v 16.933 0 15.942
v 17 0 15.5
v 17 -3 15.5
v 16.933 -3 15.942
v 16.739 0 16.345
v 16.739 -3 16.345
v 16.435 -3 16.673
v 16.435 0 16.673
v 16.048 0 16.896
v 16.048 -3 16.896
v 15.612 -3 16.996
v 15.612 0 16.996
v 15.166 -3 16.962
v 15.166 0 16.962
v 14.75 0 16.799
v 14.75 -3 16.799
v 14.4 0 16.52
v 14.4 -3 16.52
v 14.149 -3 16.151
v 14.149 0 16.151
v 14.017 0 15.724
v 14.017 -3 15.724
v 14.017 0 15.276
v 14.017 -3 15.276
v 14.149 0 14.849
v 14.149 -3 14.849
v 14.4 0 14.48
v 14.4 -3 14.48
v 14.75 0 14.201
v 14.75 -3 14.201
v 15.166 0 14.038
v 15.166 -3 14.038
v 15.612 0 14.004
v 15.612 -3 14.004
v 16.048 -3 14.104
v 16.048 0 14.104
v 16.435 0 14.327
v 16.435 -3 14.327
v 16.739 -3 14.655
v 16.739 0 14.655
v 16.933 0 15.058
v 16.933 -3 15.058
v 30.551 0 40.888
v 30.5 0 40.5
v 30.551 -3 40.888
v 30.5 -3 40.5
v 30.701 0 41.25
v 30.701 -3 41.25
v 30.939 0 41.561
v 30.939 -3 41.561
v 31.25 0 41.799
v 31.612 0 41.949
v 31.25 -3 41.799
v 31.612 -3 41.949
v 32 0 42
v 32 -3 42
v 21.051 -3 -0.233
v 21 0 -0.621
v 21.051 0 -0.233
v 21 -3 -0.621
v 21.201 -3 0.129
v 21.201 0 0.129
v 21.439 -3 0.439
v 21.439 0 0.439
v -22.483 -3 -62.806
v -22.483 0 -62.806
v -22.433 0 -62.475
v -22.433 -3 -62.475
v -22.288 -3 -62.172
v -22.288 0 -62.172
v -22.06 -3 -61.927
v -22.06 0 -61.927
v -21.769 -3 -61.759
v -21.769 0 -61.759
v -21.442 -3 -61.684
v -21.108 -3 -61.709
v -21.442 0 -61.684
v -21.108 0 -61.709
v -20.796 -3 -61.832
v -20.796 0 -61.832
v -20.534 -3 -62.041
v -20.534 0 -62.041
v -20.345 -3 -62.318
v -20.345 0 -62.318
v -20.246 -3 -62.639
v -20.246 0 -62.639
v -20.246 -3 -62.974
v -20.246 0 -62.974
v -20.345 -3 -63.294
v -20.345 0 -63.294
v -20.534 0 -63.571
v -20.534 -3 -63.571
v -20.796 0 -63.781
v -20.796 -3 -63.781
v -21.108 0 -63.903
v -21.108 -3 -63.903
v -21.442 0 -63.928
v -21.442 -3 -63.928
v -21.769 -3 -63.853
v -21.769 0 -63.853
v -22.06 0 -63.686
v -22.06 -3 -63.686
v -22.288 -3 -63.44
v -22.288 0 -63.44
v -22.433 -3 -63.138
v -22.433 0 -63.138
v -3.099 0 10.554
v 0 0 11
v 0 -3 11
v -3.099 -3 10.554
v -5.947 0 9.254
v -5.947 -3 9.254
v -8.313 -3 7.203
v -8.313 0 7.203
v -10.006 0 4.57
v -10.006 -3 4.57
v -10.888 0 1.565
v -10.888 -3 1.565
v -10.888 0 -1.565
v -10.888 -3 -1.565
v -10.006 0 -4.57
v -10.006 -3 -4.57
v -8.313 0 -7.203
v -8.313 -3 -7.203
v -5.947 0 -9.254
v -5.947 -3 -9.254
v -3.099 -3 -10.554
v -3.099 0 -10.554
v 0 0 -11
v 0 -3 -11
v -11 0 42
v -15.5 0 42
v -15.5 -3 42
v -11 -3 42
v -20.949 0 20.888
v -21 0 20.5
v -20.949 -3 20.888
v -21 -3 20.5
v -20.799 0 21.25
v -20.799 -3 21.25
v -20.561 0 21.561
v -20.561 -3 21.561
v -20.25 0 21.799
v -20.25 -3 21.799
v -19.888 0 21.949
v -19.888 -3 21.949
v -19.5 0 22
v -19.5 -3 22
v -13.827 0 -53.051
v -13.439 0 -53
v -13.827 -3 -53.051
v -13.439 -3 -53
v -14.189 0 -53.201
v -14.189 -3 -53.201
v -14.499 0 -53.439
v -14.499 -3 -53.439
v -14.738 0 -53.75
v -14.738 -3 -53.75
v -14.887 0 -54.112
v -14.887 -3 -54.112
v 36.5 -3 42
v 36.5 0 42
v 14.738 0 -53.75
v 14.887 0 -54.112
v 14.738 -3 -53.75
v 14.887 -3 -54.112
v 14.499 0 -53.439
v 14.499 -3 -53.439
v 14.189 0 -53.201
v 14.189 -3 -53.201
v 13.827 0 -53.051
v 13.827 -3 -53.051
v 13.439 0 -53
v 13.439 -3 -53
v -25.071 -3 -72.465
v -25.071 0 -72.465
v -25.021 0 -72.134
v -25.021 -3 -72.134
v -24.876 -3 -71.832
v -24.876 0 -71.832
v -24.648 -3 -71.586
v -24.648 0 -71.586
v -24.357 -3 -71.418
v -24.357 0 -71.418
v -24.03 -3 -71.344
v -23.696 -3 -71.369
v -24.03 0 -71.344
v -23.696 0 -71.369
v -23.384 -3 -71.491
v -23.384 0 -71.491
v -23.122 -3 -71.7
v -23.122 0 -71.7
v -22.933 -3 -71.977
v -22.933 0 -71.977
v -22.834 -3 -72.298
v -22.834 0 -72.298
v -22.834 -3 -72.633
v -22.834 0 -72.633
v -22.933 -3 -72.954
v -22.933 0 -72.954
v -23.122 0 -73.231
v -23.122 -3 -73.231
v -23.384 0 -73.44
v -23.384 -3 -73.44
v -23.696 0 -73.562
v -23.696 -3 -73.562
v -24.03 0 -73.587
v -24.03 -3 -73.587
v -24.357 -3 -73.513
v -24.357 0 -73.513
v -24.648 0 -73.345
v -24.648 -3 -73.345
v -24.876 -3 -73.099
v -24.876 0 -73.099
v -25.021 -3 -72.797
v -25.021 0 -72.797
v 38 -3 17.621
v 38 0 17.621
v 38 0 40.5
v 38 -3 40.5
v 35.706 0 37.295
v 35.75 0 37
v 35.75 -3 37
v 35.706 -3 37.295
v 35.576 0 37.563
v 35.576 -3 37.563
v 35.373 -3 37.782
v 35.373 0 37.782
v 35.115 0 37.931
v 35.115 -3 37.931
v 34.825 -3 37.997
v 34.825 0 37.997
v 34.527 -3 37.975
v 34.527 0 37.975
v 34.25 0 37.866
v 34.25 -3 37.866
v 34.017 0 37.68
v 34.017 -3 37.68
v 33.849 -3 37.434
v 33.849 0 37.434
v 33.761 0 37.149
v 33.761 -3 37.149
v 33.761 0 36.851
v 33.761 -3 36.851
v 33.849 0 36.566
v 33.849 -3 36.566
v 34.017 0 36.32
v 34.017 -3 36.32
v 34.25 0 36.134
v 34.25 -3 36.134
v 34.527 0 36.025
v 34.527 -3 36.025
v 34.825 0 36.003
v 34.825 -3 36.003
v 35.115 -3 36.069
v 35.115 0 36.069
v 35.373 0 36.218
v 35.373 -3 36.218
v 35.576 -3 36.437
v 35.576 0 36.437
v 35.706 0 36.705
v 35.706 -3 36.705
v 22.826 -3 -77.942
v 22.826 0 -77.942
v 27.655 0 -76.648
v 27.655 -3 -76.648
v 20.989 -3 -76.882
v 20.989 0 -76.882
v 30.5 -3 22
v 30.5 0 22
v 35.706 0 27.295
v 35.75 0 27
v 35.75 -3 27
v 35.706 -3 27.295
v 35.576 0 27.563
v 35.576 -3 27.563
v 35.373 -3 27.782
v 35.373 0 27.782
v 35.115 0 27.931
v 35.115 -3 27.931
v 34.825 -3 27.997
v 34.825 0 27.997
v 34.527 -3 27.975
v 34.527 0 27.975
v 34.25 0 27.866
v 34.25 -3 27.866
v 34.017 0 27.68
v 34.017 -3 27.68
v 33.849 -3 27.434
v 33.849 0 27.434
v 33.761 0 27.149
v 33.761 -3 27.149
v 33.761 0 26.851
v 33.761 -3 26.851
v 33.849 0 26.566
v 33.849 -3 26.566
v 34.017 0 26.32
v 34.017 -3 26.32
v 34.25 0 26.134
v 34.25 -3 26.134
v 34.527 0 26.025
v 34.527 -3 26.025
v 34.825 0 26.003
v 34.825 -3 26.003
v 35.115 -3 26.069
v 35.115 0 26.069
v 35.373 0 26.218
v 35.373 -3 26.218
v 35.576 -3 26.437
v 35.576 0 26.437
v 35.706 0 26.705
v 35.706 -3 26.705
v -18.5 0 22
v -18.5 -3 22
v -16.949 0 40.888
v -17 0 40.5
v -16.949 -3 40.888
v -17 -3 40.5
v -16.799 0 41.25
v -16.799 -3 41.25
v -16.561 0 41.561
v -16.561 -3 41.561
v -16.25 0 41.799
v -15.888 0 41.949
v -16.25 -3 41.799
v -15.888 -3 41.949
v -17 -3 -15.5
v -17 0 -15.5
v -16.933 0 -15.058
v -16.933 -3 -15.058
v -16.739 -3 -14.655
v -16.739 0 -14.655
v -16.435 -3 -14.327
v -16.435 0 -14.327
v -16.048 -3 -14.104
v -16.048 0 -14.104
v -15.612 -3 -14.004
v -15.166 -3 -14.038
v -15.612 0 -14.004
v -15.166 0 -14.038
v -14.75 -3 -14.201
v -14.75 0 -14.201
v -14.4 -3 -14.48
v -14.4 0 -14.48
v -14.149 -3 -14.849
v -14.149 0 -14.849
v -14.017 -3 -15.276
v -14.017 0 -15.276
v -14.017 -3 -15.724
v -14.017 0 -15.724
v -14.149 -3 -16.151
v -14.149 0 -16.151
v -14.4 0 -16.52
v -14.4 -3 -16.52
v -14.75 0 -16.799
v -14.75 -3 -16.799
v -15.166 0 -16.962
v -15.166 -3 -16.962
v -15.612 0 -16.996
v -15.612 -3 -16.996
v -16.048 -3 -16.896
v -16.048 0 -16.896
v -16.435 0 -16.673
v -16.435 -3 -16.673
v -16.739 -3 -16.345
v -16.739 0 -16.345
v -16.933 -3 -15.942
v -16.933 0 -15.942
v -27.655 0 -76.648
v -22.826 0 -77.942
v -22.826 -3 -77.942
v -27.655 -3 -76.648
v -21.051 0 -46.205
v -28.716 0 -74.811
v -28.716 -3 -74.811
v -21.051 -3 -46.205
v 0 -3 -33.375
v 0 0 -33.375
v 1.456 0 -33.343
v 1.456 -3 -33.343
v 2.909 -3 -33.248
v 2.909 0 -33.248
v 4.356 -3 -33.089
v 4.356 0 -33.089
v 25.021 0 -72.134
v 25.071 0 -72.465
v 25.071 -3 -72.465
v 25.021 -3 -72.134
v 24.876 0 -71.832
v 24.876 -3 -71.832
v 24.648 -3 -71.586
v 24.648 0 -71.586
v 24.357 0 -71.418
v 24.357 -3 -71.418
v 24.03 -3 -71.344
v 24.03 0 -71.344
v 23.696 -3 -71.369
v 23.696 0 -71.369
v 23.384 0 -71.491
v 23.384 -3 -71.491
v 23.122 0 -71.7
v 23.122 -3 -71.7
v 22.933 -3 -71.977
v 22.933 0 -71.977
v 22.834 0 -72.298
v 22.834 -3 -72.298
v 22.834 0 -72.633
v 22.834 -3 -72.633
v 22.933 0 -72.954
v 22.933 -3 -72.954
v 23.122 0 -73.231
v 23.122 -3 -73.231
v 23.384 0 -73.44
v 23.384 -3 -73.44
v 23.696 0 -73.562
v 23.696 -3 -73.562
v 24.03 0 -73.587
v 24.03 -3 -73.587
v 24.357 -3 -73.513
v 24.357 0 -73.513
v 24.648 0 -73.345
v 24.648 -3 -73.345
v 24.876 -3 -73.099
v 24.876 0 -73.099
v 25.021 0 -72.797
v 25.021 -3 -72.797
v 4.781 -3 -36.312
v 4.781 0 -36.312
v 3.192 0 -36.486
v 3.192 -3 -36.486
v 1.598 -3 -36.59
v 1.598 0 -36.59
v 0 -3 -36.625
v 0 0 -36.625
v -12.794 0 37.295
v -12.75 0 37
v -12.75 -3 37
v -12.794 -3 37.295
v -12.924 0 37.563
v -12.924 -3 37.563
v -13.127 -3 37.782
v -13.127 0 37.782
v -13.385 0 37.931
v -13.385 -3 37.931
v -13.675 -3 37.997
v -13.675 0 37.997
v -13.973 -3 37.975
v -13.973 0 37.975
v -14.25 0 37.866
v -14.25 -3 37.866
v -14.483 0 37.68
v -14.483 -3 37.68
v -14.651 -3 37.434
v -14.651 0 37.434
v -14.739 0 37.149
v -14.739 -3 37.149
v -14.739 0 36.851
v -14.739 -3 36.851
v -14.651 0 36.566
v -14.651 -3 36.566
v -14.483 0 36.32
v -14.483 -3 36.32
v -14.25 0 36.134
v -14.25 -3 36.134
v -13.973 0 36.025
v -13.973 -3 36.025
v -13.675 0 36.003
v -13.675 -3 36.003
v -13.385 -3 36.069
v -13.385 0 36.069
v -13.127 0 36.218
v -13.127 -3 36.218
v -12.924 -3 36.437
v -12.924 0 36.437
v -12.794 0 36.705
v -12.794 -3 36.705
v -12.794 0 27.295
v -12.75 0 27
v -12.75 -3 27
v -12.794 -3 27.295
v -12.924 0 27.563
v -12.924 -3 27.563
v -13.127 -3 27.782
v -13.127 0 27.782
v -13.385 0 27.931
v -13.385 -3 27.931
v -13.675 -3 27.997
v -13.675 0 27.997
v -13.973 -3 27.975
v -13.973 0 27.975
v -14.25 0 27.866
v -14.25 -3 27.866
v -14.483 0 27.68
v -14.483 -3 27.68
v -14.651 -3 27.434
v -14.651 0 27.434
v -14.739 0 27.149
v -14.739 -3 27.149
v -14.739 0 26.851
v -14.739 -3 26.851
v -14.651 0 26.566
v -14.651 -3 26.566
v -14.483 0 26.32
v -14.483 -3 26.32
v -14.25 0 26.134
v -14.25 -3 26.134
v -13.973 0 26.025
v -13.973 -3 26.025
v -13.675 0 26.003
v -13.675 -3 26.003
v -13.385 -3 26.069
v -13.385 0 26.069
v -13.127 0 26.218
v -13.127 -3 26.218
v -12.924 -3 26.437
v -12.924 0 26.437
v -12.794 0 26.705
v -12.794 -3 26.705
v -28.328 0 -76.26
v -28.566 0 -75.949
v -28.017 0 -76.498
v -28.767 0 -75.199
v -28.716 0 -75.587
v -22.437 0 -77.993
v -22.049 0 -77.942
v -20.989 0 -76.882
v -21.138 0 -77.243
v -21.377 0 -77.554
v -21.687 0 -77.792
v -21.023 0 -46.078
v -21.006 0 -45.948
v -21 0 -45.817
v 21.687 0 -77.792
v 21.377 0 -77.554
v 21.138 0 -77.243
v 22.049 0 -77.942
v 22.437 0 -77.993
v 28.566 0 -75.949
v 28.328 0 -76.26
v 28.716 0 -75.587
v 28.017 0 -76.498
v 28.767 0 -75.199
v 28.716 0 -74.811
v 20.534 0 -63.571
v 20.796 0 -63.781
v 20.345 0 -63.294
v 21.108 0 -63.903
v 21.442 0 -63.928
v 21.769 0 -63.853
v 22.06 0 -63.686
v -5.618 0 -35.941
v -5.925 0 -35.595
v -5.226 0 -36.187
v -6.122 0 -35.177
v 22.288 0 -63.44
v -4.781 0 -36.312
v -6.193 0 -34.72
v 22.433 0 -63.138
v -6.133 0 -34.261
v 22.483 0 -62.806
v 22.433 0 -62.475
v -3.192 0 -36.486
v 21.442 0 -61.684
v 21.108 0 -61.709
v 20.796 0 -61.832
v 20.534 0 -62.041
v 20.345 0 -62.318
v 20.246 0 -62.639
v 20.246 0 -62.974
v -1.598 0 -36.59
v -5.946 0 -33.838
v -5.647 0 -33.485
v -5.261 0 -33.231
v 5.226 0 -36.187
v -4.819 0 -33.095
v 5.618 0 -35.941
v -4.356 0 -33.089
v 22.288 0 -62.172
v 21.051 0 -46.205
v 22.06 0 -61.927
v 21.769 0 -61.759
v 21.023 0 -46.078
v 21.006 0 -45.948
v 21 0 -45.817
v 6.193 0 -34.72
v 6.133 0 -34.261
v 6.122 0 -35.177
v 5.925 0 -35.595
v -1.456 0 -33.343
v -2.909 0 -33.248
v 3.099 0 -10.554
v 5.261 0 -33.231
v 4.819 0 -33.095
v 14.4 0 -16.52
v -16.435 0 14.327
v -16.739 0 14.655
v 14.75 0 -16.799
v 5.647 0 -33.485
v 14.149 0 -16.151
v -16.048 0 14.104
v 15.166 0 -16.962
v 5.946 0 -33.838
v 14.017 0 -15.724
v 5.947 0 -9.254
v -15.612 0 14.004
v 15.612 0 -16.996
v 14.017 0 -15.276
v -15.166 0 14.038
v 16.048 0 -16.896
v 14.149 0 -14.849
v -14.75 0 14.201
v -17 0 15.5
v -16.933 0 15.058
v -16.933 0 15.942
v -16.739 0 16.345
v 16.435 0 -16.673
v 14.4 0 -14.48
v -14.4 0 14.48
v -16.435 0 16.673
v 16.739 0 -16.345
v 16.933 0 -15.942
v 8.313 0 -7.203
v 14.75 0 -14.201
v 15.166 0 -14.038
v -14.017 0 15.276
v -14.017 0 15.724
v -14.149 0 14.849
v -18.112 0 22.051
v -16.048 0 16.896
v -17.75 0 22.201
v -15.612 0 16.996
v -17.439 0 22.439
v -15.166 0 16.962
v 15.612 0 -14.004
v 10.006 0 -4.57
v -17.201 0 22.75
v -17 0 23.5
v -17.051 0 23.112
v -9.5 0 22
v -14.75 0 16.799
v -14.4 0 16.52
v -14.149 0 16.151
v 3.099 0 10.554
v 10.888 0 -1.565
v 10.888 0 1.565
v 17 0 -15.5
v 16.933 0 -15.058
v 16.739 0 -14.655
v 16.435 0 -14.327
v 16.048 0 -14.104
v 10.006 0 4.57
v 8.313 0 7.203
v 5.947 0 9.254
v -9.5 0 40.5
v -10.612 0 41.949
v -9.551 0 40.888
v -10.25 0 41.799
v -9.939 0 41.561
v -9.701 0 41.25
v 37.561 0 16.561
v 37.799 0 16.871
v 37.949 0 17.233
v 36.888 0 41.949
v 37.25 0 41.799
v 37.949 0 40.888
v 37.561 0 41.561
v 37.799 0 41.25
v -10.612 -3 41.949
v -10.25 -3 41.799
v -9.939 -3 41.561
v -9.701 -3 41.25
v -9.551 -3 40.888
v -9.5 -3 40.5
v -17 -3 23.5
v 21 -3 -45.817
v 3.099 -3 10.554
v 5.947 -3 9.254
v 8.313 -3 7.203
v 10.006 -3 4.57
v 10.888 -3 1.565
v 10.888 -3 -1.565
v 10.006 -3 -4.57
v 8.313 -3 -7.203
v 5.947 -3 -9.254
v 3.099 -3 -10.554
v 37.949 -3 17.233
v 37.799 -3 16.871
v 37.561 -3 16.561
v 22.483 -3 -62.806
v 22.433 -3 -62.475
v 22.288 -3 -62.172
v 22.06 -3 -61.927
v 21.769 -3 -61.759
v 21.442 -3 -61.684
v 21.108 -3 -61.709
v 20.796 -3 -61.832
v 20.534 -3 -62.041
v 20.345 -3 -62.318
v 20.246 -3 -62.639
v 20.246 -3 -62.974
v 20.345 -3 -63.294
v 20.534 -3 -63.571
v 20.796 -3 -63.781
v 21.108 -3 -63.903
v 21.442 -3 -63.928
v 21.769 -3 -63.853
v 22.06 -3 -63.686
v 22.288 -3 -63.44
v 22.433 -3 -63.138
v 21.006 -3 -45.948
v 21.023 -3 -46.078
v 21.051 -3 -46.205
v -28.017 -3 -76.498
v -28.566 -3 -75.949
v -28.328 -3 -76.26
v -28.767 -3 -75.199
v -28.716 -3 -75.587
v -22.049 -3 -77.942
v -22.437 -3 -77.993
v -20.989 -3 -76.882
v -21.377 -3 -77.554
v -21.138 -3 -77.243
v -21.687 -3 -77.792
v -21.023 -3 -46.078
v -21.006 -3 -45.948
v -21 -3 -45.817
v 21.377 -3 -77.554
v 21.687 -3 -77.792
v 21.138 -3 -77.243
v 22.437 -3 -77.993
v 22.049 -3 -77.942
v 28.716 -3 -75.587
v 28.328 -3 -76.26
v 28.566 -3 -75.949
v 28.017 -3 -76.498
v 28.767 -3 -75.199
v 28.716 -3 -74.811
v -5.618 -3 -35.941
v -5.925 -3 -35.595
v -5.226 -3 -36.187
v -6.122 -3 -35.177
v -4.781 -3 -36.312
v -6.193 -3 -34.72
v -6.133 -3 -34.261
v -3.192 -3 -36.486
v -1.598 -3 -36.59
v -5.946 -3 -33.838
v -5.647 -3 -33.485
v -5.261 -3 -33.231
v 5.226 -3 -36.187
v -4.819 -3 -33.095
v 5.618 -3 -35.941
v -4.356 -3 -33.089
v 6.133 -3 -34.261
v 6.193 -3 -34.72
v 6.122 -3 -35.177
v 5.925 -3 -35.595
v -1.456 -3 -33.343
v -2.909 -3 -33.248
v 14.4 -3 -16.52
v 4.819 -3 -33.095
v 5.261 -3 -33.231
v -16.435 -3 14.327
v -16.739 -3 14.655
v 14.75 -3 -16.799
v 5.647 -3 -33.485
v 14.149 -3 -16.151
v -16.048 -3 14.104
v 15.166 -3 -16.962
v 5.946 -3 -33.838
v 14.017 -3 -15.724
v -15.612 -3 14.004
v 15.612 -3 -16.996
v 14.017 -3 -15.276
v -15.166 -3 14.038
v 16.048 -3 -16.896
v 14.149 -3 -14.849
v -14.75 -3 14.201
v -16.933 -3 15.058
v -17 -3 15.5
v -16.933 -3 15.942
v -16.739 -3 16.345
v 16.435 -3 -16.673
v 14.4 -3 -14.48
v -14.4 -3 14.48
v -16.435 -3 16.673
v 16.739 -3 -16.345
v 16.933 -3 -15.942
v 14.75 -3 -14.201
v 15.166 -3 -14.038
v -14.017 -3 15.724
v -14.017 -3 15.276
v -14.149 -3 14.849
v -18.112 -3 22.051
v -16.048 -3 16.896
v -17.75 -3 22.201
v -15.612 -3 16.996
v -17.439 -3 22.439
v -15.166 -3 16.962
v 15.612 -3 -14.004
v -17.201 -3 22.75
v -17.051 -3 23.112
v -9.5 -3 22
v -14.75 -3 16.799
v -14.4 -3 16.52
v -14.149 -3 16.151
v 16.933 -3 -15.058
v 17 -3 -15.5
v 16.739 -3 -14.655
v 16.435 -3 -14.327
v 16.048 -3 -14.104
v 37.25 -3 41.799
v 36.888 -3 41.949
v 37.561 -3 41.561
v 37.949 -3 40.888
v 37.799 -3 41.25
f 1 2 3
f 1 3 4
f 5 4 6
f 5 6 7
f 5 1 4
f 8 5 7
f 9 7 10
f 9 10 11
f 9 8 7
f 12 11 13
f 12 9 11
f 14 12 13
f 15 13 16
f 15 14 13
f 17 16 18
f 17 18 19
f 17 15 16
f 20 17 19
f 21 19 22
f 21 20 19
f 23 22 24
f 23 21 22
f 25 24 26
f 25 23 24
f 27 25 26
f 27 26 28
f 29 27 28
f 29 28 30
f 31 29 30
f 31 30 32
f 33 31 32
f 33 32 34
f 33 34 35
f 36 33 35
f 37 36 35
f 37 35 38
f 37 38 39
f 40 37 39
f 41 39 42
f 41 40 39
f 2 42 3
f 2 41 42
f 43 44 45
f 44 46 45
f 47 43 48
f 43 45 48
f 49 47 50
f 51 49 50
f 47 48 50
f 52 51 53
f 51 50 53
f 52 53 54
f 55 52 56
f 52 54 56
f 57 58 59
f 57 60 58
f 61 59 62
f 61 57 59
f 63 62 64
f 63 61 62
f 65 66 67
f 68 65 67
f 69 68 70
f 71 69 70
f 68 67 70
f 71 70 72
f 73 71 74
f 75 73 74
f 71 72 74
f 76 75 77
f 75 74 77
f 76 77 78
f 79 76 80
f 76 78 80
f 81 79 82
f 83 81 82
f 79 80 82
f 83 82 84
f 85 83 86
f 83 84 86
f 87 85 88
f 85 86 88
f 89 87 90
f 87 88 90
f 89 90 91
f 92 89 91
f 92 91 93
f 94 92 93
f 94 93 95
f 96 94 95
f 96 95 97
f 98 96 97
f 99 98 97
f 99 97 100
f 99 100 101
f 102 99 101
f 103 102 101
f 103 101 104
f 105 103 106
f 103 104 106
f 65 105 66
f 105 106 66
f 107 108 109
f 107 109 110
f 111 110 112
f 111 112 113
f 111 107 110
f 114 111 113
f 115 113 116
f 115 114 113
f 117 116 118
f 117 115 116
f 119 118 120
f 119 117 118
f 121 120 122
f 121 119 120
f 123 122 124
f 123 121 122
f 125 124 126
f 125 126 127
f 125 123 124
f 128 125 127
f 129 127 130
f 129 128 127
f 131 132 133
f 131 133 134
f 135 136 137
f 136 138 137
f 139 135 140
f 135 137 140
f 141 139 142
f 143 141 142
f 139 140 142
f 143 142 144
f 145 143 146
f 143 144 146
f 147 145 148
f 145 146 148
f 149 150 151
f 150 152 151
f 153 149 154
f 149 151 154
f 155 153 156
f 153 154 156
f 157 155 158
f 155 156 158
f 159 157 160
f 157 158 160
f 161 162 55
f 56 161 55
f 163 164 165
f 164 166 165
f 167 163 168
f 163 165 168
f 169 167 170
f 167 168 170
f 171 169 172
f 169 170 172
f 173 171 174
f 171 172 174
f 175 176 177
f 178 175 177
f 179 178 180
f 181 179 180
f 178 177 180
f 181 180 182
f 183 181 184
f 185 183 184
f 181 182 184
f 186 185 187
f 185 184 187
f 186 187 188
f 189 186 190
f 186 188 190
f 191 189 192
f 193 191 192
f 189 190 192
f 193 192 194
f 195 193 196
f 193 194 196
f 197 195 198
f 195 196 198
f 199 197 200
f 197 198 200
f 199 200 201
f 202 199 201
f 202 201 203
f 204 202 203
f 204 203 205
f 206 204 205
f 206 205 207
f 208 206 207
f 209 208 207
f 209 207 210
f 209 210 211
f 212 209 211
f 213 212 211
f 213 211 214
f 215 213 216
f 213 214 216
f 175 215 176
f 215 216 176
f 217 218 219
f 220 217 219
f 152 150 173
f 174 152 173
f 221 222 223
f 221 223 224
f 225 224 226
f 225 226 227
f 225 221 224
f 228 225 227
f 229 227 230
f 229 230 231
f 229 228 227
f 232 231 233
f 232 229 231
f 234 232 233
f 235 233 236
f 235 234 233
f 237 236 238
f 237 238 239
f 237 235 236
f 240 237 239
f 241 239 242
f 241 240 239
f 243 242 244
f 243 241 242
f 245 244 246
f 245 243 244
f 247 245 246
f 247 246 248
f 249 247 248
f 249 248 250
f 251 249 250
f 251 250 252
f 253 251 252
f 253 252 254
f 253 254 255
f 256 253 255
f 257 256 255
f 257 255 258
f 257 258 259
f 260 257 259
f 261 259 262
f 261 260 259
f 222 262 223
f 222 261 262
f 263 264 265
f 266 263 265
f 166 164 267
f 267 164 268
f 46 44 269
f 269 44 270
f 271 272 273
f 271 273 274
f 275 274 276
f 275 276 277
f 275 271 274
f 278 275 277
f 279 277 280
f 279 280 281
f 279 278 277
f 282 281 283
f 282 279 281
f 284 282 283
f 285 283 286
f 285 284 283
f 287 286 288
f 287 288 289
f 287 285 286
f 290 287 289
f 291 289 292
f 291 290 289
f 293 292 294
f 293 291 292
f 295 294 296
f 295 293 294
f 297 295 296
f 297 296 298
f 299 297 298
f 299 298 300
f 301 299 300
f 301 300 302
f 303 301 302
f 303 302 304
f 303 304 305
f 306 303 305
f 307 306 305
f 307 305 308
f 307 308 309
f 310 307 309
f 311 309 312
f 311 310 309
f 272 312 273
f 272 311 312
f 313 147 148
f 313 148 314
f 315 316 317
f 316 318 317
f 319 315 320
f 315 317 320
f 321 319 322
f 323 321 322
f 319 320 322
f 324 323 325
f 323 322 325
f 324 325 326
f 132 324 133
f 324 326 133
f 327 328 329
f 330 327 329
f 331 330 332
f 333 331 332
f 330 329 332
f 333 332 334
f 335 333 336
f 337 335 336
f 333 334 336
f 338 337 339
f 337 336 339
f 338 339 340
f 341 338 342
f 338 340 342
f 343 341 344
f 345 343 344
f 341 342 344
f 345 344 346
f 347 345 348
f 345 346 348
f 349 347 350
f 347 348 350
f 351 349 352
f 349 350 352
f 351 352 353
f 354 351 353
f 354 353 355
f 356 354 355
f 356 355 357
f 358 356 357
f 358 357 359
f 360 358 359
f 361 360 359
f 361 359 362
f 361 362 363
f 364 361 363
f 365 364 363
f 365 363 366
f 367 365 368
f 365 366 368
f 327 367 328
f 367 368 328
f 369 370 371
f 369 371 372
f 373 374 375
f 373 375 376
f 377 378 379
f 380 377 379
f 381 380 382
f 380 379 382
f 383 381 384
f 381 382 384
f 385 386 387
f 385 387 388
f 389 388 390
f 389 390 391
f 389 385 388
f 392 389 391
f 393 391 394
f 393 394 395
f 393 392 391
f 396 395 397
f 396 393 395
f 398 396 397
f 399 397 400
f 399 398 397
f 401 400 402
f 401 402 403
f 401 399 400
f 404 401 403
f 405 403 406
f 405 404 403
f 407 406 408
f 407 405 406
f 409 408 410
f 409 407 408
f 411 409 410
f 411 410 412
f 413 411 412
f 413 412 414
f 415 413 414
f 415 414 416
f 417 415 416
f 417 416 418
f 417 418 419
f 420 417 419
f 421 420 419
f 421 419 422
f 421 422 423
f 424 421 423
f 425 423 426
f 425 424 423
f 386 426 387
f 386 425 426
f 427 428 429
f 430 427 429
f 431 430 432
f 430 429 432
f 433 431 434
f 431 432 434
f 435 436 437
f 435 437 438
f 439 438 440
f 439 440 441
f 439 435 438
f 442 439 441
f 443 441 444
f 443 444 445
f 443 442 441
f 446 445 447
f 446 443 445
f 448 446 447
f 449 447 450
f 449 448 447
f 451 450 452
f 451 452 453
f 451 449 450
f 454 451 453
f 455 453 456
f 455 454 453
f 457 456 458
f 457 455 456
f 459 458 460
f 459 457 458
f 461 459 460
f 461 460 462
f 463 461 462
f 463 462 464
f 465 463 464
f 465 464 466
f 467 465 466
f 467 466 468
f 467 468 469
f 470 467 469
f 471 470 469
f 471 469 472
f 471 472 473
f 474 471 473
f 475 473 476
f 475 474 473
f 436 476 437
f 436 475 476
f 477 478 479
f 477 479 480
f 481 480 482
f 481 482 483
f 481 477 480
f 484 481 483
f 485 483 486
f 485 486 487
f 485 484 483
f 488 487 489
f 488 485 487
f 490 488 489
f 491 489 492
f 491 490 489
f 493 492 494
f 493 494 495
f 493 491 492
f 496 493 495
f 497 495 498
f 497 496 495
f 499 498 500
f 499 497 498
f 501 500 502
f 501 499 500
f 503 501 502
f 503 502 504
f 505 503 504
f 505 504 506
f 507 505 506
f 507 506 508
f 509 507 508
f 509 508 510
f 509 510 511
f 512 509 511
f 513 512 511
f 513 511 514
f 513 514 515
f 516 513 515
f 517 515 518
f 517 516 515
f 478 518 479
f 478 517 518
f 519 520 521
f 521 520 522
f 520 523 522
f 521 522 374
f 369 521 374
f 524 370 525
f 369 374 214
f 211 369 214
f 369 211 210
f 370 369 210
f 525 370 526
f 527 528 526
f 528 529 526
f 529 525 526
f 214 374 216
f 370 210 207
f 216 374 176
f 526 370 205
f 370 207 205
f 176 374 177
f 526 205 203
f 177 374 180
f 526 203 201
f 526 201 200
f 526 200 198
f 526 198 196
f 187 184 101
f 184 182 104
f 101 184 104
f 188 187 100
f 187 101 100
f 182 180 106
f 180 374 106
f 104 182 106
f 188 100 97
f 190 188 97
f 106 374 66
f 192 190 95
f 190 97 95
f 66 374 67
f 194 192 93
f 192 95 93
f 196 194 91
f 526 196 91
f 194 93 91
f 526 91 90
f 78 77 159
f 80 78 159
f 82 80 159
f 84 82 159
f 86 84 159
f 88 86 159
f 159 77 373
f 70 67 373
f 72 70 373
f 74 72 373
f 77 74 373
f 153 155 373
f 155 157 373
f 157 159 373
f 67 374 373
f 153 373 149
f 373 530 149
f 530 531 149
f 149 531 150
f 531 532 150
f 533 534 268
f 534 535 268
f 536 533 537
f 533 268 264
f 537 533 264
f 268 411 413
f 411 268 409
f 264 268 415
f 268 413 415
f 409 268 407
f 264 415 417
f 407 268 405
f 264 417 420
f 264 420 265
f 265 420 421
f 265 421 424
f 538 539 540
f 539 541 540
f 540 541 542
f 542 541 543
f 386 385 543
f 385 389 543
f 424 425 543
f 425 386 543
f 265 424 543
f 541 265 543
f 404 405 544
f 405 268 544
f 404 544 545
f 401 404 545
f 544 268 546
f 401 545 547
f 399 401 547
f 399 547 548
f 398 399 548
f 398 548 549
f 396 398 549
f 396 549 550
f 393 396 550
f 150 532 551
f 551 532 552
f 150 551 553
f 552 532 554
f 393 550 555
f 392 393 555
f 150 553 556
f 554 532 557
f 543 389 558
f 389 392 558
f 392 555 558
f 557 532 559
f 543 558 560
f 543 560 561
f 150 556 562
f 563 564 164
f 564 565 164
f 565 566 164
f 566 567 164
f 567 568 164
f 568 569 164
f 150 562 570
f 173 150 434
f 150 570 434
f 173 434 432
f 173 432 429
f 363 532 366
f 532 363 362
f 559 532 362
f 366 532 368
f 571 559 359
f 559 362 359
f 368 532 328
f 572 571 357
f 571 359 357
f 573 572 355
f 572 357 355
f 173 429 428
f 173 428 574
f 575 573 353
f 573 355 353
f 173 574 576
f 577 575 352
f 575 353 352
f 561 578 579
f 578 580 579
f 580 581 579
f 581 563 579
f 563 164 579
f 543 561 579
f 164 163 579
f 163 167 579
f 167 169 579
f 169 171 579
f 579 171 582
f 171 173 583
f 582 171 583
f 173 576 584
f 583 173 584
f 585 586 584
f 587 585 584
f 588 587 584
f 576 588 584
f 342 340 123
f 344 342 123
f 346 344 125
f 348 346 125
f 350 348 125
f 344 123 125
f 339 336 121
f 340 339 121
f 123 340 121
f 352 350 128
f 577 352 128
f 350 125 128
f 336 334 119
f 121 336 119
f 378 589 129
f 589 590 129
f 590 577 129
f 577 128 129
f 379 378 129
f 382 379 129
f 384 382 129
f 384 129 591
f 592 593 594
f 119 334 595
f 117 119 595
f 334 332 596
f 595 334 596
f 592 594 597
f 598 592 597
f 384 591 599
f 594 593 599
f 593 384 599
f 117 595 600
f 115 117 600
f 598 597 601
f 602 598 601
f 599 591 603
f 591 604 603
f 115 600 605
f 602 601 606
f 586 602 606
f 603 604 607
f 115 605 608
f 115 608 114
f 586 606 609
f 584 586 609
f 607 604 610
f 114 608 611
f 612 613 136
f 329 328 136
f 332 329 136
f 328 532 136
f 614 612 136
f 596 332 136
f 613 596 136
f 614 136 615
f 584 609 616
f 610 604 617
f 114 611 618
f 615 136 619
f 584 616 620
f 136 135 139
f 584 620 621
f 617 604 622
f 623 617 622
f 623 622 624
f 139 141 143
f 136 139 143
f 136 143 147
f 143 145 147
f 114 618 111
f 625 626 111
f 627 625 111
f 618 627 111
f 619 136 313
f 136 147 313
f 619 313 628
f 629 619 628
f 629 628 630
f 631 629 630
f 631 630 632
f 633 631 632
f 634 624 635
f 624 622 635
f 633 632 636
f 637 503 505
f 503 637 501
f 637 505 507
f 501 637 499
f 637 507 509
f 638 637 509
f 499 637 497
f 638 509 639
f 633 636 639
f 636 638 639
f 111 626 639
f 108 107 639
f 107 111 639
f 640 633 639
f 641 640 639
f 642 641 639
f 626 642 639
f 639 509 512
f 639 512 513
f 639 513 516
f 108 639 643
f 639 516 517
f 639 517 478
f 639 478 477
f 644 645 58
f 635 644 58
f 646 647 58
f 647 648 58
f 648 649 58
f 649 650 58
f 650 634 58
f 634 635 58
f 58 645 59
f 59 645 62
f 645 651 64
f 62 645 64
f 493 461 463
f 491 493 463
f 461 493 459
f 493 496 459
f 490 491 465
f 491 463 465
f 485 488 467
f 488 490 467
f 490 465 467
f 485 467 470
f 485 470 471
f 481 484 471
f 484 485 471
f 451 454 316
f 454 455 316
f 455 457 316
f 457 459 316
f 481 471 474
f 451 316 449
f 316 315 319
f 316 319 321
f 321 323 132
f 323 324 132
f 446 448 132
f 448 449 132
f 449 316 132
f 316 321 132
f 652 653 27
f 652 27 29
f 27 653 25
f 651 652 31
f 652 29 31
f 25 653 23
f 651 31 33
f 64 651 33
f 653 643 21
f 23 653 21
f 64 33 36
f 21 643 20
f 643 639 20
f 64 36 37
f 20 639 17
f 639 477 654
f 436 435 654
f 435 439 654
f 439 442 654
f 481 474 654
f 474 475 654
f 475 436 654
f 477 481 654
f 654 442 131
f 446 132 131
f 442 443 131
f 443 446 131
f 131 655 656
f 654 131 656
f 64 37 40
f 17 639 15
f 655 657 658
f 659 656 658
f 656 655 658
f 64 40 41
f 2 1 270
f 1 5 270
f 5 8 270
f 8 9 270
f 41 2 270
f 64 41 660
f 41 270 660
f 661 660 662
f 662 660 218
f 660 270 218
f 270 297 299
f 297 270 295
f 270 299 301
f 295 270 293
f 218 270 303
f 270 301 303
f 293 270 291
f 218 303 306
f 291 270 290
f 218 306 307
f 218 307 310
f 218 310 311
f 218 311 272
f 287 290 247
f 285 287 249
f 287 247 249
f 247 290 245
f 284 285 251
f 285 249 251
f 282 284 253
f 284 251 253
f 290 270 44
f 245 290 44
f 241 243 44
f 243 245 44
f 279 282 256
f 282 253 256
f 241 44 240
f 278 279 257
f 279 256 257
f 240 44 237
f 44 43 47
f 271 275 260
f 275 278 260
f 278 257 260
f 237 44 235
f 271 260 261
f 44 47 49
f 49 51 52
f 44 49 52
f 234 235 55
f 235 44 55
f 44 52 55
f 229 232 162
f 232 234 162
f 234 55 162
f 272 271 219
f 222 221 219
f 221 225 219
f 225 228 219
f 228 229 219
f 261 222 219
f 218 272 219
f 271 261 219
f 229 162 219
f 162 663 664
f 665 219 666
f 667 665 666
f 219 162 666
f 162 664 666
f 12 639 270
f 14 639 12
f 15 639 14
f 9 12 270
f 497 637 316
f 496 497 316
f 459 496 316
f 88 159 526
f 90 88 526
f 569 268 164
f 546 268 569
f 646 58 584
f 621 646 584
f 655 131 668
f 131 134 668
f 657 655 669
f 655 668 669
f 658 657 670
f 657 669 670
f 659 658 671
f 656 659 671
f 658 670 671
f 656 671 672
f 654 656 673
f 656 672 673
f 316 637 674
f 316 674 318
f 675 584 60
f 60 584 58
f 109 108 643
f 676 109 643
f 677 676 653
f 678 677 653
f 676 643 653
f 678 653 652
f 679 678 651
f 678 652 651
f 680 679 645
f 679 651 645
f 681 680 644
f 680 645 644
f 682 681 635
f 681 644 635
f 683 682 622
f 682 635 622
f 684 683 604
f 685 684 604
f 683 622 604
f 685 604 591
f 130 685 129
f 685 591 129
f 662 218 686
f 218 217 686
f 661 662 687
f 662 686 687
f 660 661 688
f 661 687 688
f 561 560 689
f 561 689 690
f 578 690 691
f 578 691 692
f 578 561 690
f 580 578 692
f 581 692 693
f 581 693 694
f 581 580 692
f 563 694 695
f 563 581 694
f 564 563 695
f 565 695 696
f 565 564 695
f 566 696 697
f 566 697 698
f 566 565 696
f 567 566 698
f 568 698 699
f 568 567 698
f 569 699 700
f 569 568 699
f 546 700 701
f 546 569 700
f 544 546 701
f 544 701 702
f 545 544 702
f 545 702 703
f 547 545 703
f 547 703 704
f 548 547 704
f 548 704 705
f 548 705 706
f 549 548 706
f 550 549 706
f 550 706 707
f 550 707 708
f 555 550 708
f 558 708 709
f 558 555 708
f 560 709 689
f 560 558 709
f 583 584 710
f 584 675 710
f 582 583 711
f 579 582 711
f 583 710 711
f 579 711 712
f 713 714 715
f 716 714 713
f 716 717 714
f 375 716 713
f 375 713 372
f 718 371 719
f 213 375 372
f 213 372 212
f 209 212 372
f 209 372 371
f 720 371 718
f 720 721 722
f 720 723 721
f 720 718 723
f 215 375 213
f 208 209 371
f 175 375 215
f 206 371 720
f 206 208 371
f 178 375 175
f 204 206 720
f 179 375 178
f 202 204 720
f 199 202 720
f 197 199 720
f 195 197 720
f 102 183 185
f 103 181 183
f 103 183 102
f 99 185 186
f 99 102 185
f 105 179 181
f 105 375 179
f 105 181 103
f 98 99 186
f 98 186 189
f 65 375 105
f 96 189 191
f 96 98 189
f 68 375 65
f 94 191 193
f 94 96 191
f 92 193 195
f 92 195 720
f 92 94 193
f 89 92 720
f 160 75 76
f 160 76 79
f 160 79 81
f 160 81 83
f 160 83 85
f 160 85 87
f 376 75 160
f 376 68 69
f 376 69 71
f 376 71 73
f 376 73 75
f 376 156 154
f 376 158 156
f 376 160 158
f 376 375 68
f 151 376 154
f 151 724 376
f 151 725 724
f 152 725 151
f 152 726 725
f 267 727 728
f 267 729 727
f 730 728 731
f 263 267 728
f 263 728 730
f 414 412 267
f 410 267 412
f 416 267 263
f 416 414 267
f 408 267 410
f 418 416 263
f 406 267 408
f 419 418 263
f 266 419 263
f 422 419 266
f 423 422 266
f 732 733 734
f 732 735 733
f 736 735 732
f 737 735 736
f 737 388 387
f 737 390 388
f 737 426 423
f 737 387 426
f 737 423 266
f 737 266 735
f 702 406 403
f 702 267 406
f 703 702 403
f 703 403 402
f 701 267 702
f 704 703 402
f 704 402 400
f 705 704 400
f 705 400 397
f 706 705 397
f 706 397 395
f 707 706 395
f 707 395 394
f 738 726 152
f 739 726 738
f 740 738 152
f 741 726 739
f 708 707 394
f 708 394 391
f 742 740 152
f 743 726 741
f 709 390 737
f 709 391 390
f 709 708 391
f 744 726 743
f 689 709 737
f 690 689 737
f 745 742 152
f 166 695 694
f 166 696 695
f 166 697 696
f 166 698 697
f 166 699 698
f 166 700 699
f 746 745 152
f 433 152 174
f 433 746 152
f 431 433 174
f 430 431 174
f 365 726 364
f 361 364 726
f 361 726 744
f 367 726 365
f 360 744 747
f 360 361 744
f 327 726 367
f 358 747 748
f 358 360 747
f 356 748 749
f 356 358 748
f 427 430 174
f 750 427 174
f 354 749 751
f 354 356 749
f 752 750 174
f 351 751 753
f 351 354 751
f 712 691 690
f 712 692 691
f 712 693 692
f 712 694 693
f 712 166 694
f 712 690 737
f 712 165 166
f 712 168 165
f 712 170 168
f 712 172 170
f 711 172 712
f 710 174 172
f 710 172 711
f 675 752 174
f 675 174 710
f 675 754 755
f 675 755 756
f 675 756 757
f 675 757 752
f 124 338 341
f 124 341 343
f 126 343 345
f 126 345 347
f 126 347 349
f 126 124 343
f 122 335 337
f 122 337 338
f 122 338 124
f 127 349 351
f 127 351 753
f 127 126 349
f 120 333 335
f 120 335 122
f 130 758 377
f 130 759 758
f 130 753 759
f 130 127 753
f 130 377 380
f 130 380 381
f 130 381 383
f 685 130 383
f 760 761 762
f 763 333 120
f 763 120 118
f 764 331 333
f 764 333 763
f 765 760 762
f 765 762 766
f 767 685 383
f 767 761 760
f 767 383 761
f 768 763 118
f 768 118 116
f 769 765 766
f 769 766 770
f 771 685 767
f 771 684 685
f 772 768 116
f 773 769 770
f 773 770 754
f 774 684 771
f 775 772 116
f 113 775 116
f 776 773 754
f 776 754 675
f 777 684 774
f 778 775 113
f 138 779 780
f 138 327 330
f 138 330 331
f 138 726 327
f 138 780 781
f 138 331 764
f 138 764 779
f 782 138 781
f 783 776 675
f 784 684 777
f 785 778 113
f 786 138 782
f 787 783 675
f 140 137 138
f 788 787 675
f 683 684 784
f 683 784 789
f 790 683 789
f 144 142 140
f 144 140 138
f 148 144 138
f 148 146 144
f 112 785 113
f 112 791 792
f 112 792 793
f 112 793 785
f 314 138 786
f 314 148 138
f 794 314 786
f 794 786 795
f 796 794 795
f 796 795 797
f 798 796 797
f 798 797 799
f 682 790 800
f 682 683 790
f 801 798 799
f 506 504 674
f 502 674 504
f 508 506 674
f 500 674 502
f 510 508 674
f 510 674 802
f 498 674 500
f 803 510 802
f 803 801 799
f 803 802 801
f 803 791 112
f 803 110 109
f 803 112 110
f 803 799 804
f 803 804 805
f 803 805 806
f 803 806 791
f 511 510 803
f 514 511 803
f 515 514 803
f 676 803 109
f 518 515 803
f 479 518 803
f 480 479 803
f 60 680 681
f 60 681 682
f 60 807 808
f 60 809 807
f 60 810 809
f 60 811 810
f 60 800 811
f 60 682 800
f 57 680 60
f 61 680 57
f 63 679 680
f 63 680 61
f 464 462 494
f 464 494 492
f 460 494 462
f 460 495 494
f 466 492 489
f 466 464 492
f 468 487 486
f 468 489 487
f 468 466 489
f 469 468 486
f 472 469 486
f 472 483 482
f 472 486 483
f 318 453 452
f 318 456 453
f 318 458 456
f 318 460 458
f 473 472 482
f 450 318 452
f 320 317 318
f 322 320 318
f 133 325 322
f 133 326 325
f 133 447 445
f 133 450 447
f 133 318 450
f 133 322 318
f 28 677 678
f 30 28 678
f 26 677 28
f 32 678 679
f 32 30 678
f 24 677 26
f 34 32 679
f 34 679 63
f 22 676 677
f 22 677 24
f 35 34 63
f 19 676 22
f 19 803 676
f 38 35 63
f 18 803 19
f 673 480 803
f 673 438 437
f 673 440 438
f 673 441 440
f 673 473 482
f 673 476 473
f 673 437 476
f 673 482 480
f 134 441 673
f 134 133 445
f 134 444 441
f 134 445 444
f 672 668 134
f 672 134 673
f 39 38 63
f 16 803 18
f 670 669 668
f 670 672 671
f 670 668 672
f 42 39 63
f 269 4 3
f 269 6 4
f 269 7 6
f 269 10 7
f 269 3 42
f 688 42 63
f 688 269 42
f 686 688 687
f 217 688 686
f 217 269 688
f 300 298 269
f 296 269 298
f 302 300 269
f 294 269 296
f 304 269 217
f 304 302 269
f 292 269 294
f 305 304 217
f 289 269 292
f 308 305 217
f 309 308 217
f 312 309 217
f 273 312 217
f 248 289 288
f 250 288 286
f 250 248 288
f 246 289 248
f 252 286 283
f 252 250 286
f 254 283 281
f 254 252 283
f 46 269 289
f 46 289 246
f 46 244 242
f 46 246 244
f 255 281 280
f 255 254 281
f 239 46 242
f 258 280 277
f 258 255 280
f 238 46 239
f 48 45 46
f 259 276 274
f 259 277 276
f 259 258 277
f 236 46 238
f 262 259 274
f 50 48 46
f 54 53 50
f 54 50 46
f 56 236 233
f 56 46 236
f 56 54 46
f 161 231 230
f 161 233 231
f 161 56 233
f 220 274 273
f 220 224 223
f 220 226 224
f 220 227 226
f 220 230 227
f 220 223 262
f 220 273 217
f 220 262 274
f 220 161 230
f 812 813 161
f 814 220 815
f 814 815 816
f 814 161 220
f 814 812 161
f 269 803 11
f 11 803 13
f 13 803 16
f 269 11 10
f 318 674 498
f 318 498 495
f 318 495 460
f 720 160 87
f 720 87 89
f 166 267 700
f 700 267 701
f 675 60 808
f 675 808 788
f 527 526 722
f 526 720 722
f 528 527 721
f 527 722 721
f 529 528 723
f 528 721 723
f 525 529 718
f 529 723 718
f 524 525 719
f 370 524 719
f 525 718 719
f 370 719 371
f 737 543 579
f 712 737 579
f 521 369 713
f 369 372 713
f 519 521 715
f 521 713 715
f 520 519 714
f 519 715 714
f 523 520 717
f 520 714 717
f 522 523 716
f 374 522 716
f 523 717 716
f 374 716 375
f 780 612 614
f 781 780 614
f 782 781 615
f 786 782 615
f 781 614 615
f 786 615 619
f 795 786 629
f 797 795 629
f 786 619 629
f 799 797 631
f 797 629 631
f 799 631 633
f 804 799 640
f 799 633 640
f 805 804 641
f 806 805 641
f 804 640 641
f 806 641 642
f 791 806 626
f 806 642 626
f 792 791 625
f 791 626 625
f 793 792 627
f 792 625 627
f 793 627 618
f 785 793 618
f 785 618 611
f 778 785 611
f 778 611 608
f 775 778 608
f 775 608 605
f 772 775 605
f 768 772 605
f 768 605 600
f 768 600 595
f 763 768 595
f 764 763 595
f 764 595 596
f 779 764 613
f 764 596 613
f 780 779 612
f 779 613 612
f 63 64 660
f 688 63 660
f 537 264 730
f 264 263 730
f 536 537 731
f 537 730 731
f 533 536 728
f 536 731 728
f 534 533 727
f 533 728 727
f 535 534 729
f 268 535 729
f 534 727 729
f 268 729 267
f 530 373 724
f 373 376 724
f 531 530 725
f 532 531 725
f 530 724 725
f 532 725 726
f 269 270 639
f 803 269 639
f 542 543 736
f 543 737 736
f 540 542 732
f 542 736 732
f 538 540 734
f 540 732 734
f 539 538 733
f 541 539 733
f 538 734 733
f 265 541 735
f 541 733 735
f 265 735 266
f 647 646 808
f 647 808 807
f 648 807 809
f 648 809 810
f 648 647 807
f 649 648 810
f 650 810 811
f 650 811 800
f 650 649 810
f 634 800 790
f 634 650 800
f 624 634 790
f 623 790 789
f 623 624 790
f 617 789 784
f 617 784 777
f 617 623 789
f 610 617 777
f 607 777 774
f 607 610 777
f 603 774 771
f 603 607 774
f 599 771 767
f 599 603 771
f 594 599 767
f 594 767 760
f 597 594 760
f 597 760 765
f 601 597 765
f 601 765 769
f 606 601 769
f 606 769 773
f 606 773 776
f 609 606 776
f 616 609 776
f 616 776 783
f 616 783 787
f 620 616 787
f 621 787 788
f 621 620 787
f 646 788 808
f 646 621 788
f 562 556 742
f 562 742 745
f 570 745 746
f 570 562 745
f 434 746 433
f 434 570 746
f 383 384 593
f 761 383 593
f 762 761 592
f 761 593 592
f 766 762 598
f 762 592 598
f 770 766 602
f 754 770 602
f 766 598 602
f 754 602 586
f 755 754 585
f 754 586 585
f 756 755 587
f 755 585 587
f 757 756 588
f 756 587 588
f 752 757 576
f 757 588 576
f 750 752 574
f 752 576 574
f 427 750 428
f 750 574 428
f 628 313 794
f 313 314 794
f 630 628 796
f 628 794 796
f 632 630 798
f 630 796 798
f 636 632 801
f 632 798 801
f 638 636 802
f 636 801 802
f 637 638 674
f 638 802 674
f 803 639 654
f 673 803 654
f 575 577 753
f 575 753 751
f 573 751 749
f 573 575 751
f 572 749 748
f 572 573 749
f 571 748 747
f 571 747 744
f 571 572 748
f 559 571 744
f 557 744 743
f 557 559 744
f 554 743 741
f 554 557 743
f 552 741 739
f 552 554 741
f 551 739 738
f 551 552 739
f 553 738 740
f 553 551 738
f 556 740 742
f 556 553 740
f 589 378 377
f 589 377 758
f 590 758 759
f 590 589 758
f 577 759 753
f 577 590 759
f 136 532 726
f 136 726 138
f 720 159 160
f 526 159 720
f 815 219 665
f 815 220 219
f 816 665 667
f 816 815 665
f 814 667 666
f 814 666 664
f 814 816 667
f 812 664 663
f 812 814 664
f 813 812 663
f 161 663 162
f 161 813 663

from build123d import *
from build123d import SkipClean  # not in build123d's __all__

# Parameters (mm, degrees)
F1_R     = 1.125
F1_R_2   = 1.5
F2_DEPTH = 3
F4_R     = 1
F4_W     = 7.5
F4_H     = 20
F5_DEPTH = 3
F6_R     = 1.5


with BuildPart() as f2:
    # F1 (on Front) → F2 (new body)
    with BuildSketch(Plane.XZ):
        with BuildLine():
            Line((0, 22), (0, 11))
            ThreePointArc((0, 11), (11, 0), (0, -11))
            Line((0, -11), (0, -33.375))
            ThreePointArc((0, -33.375), (2.1828294381, -33.3035415631), (4.3563116653, -33.0894722484))
            ThreePointArc((4.3563116653, -33.0894722484), (6.1795146274, -34.4884650857), (4.7805217901, -36.3116680478))
            ThreePointArc((4.7805217901, -36.3116680478), (2.3953896081, -36.5465830636), (0, -36.625))
            Line((0, -36.625), (0, -53))
            Line((0, -53), (14.5895357507, -53))
            Line((14.5895357507, -53), (21.3767935231, -78.330390851))
            Line((21.3767935231, -78.330390851), (29.104200163, -76.2598384823))
            Line((29.104200163, -76.2598384823), (21, -46.0145517191))
            Line((21, -46.0145517191), (21, 22))
            Line((21, 22), (0, 22))
        make_face()
        with Locations((21.3582111666, -62.8062272723)):
            Circle(F1_R, mode=Mode.SUBTRACT)
        with Locations((23.9464016176, -72.4654855352)):
            Circle(F1_R, mode=Mode.SUBTRACT)
        with Locations((15.5, -15.5)):
            Circle(F1_R_2, mode=Mode.SUBTRACT)
        with Locations((15.5, 15.5)):
            Circle(F1_R_2, mode=Mode.SUBTRACT)
    extrude(amount=F2_DEPTH)

    # F3: F2 across face


with BuildPart() as f2_1:
    add(f2.part, clean=False)
    with SkipClean():  # cleaning this boolean's faces spoils the solid; the shape is the same uncleaned
        add(f2.part.mirror(Plane(origin=(0, -1.5, -22.1875), x_dir=(0, -1, 0), z_dir=(-1, 0, 0))), clean=False)

    # F4 (on Front) → F5 (join)
    with BuildSketch(Plane.XZ):
        Polygon((38, 17), (38, 42), (30.5, 42), (30.5, 22), (21, 22), (21, 0), align=None)
        with Locations((34.75, 27)):
            Circle(F4_R, mode=Mode.SUBTRACT)
        with Locations((34.75, 37)):
            Circle(F4_R, mode=Mode.SUBTRACT)
        with Locations((-13.25, 32)):
            Rectangle(F4_W, F4_H)
        with Locations((-13.75, 27)):
            Circle(F4_R, mode=Mode.SUBTRACT)
        with Locations((-13.75, 37)):
            Circle(F4_R, mode=Mode.SUBTRACT)
    extrude(amount=F5_DEPTH)

    # F6
    f6_edges = [f2_1.edges().sort_by_distance(p)[0] for p in [
        (-21, -1.5, 22),
        (-17, -1.5, 42),
        (-9.5, -1.5, 42),
        (30.5, -1.5, 42),
        (38, -1.5, 42),
        (38, -1.5, 17),
        (21, -1.5, 0),
        (21, -1.5, -46.014552),
        (29.1042, -1.5, -76.259838),
        (21.376794, -1.5, -78.330391),
        (-14.589536, -1.5, -53),
        (-21.376794, -1.5, -78.330391),
        (-29.1042, -1.5, -76.259838),
        (14.589536, -1.5, -53),
        (-21, -1.5, -46.014552),
        (-17, -1.5, 22),
    ]]
    fillet(f6_edges, radius=F6_R)


solid = f2_1.part
